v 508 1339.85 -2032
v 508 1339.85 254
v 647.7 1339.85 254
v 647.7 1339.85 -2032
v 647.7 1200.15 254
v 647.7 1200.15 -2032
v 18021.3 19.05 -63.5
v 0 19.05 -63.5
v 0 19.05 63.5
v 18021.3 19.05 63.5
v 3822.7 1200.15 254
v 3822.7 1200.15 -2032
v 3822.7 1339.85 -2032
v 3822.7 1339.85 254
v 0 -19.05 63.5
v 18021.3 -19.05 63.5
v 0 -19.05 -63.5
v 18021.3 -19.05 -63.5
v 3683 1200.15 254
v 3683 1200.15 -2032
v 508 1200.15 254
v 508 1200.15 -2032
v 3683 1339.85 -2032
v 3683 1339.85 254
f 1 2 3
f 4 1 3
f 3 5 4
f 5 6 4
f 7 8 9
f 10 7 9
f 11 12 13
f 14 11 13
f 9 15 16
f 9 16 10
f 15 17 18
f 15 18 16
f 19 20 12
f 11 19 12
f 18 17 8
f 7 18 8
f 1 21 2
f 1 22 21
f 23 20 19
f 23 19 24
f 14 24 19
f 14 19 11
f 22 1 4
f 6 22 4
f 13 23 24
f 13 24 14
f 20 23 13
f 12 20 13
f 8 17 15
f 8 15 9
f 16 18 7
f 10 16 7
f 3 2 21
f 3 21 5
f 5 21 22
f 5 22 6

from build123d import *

# Parameters (mm, degrees)
F0_W          = 38.1
F0_H          = 127
F1_DEPTH      = 18021.3
F2_W          = 139.7
F2_H          = 139.7
F3_DEPTH      = 2032
F3_DEPTH_BACK = 254
F4_W          = 139.7
F4_H          = 139.7
F5_DEPTH      = 254
F5_DEPTH_BACK = 2032


with BuildPart() as f1:
    # F0 (on Right) → F1 (new body)
    with BuildSketch(Plane.YZ):
        Rectangle(F0_W, F0_H)
    extrude(amount=F1_DEPTH)


with BuildPart() as f3:
    # F2 (on Top) → F3 (new body, two sides)
    with BuildSketch(Plane.XY) as f3_sk:
        with Locations((577.85, 1270)):
            Rectangle(F2_W, F2_H)
    extrude(amount=-F3_DEPTH)
    extrude(f3_sk.sketch, amount=F3_DEPTH_BACK)


with BuildPart() as f5:
    # F4 (on Top) → F5 (new body, two sides)
    with BuildSketch(Plane.XY) as f5_sk:
        with Locations((3752.85, 1270)):
            Rectangle(F4_W, F4_H)
    extrude(amount=F5_DEPTH)
    extrude(f5_sk.sketch, amount=-F5_DEPTH_BACK)


solid = Compound([f1.part, f3.part, f5.part])
